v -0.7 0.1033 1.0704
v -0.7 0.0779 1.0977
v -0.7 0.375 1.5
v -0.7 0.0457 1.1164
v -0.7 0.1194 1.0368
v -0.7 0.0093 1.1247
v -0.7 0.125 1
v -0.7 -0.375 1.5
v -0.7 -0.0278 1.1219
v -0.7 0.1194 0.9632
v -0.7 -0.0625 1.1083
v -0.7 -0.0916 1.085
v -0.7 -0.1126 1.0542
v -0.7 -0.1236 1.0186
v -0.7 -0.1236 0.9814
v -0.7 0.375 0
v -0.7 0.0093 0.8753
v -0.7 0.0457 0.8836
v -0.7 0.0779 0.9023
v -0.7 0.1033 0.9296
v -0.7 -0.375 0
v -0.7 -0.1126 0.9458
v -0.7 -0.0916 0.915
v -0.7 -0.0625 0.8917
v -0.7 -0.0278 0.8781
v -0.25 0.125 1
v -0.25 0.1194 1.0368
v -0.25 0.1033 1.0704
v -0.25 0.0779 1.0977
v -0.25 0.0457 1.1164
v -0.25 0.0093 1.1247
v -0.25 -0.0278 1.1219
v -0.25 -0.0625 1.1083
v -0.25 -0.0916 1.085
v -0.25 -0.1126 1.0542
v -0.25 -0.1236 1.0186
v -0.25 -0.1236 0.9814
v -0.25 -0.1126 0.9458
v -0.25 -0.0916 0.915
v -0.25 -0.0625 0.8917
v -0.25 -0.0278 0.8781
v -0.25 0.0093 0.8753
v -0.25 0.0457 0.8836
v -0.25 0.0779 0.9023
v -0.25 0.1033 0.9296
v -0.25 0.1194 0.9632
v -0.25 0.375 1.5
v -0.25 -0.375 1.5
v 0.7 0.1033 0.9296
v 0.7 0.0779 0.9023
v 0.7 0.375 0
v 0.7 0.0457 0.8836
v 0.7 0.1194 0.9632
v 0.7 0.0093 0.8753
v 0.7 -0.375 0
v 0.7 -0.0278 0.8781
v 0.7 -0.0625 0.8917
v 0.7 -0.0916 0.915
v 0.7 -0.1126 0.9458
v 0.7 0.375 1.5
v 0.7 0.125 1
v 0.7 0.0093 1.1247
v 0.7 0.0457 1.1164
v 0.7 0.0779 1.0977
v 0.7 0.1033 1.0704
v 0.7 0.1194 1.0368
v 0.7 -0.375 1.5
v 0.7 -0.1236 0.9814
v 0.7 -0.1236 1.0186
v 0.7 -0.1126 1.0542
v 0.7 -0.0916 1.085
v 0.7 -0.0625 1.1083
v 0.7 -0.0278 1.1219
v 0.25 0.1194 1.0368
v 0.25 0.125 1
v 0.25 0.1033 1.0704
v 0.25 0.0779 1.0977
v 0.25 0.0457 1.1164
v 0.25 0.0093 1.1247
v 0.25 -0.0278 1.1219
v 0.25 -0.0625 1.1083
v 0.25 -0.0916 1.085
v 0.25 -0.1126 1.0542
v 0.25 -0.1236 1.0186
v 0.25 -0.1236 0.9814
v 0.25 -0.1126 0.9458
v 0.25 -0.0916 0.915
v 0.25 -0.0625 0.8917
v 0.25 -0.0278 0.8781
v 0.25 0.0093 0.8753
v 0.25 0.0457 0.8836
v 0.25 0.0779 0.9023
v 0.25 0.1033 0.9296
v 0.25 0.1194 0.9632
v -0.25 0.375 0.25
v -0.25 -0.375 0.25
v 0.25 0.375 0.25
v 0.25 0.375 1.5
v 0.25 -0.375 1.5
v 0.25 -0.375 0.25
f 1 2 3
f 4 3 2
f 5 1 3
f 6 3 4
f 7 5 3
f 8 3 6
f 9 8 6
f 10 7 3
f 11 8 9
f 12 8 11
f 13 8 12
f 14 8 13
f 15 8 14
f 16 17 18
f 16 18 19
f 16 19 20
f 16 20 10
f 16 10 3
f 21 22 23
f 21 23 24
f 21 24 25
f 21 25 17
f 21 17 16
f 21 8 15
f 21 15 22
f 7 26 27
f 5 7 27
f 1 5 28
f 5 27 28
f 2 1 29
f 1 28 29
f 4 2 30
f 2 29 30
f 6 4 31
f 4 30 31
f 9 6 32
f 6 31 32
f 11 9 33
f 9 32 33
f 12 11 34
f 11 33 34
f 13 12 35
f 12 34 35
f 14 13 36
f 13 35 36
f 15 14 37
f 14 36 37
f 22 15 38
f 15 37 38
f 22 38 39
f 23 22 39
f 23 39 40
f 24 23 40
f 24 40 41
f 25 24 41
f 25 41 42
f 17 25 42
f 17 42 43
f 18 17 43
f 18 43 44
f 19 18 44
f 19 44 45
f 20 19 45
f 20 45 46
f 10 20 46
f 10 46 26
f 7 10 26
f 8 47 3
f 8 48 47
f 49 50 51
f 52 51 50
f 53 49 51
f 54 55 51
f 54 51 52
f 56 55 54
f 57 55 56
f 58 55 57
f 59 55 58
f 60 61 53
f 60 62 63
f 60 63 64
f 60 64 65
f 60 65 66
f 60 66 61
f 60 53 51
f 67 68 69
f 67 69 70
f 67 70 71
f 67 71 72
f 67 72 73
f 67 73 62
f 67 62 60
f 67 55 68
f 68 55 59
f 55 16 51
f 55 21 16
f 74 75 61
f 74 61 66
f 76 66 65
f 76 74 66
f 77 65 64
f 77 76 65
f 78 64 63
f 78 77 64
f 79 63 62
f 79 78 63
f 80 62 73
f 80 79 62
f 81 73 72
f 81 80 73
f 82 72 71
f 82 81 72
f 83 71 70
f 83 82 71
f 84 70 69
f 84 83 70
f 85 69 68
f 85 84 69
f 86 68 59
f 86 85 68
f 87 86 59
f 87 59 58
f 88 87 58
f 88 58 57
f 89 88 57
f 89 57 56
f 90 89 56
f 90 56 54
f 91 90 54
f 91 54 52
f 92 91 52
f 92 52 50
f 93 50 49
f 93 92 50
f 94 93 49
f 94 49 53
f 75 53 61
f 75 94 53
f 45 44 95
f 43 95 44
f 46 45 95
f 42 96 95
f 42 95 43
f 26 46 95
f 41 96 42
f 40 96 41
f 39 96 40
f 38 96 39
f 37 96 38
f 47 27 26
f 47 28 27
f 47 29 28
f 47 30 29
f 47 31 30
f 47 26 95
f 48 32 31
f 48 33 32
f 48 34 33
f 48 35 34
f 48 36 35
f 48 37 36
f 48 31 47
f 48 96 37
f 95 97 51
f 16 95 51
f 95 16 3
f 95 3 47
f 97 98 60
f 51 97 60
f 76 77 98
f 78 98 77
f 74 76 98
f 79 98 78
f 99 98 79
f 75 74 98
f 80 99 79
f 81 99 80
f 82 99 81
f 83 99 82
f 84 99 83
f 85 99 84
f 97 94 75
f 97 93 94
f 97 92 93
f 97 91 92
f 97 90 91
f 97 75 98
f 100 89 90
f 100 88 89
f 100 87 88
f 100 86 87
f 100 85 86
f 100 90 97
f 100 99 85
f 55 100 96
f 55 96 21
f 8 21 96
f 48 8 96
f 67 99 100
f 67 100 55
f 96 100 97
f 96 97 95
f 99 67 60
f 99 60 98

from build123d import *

# Parameters (mm, degrees)
F1_DEPTH      = 0.375
F1_DEPTH_BACK = 0.375
F2_R          = 0.125
F3_DEPTH      = 25
F3_DEPTH_BACK = 25


with BuildPart() as f1:
    # F0 (on Front) → F1 (new body, two sides)
    with BuildSketch(Plane.XZ) as f1_sk:
        Polygon((-0.7, 0), (0, 0), (0.7, 0), (0.7, 1.5), (0.25, 1.5), (0.25, 0.25), (-0.25, 0.25), (-0.25, 1.5), (-0.7, 1.5), align=None)
    extrude(amount=F1_DEPTH)
    extrude(f1_sk.sketch, amount=-F1_DEPTH_BACK)

    # F2 (on Right) → F3 (cut, two sides)
    with BuildSketch(Plane.YZ) as f3_sk:
        with Locations((0, 1)):
            Circle(F2_R)
    extrude(amount=-F3_DEPTH, mode=Mode.SUBTRACT)
    extrude(f3_sk.sketch, amount=F3_DEPTH_BACK, mode=Mode.SUBTRACT)


solid = f1.part
